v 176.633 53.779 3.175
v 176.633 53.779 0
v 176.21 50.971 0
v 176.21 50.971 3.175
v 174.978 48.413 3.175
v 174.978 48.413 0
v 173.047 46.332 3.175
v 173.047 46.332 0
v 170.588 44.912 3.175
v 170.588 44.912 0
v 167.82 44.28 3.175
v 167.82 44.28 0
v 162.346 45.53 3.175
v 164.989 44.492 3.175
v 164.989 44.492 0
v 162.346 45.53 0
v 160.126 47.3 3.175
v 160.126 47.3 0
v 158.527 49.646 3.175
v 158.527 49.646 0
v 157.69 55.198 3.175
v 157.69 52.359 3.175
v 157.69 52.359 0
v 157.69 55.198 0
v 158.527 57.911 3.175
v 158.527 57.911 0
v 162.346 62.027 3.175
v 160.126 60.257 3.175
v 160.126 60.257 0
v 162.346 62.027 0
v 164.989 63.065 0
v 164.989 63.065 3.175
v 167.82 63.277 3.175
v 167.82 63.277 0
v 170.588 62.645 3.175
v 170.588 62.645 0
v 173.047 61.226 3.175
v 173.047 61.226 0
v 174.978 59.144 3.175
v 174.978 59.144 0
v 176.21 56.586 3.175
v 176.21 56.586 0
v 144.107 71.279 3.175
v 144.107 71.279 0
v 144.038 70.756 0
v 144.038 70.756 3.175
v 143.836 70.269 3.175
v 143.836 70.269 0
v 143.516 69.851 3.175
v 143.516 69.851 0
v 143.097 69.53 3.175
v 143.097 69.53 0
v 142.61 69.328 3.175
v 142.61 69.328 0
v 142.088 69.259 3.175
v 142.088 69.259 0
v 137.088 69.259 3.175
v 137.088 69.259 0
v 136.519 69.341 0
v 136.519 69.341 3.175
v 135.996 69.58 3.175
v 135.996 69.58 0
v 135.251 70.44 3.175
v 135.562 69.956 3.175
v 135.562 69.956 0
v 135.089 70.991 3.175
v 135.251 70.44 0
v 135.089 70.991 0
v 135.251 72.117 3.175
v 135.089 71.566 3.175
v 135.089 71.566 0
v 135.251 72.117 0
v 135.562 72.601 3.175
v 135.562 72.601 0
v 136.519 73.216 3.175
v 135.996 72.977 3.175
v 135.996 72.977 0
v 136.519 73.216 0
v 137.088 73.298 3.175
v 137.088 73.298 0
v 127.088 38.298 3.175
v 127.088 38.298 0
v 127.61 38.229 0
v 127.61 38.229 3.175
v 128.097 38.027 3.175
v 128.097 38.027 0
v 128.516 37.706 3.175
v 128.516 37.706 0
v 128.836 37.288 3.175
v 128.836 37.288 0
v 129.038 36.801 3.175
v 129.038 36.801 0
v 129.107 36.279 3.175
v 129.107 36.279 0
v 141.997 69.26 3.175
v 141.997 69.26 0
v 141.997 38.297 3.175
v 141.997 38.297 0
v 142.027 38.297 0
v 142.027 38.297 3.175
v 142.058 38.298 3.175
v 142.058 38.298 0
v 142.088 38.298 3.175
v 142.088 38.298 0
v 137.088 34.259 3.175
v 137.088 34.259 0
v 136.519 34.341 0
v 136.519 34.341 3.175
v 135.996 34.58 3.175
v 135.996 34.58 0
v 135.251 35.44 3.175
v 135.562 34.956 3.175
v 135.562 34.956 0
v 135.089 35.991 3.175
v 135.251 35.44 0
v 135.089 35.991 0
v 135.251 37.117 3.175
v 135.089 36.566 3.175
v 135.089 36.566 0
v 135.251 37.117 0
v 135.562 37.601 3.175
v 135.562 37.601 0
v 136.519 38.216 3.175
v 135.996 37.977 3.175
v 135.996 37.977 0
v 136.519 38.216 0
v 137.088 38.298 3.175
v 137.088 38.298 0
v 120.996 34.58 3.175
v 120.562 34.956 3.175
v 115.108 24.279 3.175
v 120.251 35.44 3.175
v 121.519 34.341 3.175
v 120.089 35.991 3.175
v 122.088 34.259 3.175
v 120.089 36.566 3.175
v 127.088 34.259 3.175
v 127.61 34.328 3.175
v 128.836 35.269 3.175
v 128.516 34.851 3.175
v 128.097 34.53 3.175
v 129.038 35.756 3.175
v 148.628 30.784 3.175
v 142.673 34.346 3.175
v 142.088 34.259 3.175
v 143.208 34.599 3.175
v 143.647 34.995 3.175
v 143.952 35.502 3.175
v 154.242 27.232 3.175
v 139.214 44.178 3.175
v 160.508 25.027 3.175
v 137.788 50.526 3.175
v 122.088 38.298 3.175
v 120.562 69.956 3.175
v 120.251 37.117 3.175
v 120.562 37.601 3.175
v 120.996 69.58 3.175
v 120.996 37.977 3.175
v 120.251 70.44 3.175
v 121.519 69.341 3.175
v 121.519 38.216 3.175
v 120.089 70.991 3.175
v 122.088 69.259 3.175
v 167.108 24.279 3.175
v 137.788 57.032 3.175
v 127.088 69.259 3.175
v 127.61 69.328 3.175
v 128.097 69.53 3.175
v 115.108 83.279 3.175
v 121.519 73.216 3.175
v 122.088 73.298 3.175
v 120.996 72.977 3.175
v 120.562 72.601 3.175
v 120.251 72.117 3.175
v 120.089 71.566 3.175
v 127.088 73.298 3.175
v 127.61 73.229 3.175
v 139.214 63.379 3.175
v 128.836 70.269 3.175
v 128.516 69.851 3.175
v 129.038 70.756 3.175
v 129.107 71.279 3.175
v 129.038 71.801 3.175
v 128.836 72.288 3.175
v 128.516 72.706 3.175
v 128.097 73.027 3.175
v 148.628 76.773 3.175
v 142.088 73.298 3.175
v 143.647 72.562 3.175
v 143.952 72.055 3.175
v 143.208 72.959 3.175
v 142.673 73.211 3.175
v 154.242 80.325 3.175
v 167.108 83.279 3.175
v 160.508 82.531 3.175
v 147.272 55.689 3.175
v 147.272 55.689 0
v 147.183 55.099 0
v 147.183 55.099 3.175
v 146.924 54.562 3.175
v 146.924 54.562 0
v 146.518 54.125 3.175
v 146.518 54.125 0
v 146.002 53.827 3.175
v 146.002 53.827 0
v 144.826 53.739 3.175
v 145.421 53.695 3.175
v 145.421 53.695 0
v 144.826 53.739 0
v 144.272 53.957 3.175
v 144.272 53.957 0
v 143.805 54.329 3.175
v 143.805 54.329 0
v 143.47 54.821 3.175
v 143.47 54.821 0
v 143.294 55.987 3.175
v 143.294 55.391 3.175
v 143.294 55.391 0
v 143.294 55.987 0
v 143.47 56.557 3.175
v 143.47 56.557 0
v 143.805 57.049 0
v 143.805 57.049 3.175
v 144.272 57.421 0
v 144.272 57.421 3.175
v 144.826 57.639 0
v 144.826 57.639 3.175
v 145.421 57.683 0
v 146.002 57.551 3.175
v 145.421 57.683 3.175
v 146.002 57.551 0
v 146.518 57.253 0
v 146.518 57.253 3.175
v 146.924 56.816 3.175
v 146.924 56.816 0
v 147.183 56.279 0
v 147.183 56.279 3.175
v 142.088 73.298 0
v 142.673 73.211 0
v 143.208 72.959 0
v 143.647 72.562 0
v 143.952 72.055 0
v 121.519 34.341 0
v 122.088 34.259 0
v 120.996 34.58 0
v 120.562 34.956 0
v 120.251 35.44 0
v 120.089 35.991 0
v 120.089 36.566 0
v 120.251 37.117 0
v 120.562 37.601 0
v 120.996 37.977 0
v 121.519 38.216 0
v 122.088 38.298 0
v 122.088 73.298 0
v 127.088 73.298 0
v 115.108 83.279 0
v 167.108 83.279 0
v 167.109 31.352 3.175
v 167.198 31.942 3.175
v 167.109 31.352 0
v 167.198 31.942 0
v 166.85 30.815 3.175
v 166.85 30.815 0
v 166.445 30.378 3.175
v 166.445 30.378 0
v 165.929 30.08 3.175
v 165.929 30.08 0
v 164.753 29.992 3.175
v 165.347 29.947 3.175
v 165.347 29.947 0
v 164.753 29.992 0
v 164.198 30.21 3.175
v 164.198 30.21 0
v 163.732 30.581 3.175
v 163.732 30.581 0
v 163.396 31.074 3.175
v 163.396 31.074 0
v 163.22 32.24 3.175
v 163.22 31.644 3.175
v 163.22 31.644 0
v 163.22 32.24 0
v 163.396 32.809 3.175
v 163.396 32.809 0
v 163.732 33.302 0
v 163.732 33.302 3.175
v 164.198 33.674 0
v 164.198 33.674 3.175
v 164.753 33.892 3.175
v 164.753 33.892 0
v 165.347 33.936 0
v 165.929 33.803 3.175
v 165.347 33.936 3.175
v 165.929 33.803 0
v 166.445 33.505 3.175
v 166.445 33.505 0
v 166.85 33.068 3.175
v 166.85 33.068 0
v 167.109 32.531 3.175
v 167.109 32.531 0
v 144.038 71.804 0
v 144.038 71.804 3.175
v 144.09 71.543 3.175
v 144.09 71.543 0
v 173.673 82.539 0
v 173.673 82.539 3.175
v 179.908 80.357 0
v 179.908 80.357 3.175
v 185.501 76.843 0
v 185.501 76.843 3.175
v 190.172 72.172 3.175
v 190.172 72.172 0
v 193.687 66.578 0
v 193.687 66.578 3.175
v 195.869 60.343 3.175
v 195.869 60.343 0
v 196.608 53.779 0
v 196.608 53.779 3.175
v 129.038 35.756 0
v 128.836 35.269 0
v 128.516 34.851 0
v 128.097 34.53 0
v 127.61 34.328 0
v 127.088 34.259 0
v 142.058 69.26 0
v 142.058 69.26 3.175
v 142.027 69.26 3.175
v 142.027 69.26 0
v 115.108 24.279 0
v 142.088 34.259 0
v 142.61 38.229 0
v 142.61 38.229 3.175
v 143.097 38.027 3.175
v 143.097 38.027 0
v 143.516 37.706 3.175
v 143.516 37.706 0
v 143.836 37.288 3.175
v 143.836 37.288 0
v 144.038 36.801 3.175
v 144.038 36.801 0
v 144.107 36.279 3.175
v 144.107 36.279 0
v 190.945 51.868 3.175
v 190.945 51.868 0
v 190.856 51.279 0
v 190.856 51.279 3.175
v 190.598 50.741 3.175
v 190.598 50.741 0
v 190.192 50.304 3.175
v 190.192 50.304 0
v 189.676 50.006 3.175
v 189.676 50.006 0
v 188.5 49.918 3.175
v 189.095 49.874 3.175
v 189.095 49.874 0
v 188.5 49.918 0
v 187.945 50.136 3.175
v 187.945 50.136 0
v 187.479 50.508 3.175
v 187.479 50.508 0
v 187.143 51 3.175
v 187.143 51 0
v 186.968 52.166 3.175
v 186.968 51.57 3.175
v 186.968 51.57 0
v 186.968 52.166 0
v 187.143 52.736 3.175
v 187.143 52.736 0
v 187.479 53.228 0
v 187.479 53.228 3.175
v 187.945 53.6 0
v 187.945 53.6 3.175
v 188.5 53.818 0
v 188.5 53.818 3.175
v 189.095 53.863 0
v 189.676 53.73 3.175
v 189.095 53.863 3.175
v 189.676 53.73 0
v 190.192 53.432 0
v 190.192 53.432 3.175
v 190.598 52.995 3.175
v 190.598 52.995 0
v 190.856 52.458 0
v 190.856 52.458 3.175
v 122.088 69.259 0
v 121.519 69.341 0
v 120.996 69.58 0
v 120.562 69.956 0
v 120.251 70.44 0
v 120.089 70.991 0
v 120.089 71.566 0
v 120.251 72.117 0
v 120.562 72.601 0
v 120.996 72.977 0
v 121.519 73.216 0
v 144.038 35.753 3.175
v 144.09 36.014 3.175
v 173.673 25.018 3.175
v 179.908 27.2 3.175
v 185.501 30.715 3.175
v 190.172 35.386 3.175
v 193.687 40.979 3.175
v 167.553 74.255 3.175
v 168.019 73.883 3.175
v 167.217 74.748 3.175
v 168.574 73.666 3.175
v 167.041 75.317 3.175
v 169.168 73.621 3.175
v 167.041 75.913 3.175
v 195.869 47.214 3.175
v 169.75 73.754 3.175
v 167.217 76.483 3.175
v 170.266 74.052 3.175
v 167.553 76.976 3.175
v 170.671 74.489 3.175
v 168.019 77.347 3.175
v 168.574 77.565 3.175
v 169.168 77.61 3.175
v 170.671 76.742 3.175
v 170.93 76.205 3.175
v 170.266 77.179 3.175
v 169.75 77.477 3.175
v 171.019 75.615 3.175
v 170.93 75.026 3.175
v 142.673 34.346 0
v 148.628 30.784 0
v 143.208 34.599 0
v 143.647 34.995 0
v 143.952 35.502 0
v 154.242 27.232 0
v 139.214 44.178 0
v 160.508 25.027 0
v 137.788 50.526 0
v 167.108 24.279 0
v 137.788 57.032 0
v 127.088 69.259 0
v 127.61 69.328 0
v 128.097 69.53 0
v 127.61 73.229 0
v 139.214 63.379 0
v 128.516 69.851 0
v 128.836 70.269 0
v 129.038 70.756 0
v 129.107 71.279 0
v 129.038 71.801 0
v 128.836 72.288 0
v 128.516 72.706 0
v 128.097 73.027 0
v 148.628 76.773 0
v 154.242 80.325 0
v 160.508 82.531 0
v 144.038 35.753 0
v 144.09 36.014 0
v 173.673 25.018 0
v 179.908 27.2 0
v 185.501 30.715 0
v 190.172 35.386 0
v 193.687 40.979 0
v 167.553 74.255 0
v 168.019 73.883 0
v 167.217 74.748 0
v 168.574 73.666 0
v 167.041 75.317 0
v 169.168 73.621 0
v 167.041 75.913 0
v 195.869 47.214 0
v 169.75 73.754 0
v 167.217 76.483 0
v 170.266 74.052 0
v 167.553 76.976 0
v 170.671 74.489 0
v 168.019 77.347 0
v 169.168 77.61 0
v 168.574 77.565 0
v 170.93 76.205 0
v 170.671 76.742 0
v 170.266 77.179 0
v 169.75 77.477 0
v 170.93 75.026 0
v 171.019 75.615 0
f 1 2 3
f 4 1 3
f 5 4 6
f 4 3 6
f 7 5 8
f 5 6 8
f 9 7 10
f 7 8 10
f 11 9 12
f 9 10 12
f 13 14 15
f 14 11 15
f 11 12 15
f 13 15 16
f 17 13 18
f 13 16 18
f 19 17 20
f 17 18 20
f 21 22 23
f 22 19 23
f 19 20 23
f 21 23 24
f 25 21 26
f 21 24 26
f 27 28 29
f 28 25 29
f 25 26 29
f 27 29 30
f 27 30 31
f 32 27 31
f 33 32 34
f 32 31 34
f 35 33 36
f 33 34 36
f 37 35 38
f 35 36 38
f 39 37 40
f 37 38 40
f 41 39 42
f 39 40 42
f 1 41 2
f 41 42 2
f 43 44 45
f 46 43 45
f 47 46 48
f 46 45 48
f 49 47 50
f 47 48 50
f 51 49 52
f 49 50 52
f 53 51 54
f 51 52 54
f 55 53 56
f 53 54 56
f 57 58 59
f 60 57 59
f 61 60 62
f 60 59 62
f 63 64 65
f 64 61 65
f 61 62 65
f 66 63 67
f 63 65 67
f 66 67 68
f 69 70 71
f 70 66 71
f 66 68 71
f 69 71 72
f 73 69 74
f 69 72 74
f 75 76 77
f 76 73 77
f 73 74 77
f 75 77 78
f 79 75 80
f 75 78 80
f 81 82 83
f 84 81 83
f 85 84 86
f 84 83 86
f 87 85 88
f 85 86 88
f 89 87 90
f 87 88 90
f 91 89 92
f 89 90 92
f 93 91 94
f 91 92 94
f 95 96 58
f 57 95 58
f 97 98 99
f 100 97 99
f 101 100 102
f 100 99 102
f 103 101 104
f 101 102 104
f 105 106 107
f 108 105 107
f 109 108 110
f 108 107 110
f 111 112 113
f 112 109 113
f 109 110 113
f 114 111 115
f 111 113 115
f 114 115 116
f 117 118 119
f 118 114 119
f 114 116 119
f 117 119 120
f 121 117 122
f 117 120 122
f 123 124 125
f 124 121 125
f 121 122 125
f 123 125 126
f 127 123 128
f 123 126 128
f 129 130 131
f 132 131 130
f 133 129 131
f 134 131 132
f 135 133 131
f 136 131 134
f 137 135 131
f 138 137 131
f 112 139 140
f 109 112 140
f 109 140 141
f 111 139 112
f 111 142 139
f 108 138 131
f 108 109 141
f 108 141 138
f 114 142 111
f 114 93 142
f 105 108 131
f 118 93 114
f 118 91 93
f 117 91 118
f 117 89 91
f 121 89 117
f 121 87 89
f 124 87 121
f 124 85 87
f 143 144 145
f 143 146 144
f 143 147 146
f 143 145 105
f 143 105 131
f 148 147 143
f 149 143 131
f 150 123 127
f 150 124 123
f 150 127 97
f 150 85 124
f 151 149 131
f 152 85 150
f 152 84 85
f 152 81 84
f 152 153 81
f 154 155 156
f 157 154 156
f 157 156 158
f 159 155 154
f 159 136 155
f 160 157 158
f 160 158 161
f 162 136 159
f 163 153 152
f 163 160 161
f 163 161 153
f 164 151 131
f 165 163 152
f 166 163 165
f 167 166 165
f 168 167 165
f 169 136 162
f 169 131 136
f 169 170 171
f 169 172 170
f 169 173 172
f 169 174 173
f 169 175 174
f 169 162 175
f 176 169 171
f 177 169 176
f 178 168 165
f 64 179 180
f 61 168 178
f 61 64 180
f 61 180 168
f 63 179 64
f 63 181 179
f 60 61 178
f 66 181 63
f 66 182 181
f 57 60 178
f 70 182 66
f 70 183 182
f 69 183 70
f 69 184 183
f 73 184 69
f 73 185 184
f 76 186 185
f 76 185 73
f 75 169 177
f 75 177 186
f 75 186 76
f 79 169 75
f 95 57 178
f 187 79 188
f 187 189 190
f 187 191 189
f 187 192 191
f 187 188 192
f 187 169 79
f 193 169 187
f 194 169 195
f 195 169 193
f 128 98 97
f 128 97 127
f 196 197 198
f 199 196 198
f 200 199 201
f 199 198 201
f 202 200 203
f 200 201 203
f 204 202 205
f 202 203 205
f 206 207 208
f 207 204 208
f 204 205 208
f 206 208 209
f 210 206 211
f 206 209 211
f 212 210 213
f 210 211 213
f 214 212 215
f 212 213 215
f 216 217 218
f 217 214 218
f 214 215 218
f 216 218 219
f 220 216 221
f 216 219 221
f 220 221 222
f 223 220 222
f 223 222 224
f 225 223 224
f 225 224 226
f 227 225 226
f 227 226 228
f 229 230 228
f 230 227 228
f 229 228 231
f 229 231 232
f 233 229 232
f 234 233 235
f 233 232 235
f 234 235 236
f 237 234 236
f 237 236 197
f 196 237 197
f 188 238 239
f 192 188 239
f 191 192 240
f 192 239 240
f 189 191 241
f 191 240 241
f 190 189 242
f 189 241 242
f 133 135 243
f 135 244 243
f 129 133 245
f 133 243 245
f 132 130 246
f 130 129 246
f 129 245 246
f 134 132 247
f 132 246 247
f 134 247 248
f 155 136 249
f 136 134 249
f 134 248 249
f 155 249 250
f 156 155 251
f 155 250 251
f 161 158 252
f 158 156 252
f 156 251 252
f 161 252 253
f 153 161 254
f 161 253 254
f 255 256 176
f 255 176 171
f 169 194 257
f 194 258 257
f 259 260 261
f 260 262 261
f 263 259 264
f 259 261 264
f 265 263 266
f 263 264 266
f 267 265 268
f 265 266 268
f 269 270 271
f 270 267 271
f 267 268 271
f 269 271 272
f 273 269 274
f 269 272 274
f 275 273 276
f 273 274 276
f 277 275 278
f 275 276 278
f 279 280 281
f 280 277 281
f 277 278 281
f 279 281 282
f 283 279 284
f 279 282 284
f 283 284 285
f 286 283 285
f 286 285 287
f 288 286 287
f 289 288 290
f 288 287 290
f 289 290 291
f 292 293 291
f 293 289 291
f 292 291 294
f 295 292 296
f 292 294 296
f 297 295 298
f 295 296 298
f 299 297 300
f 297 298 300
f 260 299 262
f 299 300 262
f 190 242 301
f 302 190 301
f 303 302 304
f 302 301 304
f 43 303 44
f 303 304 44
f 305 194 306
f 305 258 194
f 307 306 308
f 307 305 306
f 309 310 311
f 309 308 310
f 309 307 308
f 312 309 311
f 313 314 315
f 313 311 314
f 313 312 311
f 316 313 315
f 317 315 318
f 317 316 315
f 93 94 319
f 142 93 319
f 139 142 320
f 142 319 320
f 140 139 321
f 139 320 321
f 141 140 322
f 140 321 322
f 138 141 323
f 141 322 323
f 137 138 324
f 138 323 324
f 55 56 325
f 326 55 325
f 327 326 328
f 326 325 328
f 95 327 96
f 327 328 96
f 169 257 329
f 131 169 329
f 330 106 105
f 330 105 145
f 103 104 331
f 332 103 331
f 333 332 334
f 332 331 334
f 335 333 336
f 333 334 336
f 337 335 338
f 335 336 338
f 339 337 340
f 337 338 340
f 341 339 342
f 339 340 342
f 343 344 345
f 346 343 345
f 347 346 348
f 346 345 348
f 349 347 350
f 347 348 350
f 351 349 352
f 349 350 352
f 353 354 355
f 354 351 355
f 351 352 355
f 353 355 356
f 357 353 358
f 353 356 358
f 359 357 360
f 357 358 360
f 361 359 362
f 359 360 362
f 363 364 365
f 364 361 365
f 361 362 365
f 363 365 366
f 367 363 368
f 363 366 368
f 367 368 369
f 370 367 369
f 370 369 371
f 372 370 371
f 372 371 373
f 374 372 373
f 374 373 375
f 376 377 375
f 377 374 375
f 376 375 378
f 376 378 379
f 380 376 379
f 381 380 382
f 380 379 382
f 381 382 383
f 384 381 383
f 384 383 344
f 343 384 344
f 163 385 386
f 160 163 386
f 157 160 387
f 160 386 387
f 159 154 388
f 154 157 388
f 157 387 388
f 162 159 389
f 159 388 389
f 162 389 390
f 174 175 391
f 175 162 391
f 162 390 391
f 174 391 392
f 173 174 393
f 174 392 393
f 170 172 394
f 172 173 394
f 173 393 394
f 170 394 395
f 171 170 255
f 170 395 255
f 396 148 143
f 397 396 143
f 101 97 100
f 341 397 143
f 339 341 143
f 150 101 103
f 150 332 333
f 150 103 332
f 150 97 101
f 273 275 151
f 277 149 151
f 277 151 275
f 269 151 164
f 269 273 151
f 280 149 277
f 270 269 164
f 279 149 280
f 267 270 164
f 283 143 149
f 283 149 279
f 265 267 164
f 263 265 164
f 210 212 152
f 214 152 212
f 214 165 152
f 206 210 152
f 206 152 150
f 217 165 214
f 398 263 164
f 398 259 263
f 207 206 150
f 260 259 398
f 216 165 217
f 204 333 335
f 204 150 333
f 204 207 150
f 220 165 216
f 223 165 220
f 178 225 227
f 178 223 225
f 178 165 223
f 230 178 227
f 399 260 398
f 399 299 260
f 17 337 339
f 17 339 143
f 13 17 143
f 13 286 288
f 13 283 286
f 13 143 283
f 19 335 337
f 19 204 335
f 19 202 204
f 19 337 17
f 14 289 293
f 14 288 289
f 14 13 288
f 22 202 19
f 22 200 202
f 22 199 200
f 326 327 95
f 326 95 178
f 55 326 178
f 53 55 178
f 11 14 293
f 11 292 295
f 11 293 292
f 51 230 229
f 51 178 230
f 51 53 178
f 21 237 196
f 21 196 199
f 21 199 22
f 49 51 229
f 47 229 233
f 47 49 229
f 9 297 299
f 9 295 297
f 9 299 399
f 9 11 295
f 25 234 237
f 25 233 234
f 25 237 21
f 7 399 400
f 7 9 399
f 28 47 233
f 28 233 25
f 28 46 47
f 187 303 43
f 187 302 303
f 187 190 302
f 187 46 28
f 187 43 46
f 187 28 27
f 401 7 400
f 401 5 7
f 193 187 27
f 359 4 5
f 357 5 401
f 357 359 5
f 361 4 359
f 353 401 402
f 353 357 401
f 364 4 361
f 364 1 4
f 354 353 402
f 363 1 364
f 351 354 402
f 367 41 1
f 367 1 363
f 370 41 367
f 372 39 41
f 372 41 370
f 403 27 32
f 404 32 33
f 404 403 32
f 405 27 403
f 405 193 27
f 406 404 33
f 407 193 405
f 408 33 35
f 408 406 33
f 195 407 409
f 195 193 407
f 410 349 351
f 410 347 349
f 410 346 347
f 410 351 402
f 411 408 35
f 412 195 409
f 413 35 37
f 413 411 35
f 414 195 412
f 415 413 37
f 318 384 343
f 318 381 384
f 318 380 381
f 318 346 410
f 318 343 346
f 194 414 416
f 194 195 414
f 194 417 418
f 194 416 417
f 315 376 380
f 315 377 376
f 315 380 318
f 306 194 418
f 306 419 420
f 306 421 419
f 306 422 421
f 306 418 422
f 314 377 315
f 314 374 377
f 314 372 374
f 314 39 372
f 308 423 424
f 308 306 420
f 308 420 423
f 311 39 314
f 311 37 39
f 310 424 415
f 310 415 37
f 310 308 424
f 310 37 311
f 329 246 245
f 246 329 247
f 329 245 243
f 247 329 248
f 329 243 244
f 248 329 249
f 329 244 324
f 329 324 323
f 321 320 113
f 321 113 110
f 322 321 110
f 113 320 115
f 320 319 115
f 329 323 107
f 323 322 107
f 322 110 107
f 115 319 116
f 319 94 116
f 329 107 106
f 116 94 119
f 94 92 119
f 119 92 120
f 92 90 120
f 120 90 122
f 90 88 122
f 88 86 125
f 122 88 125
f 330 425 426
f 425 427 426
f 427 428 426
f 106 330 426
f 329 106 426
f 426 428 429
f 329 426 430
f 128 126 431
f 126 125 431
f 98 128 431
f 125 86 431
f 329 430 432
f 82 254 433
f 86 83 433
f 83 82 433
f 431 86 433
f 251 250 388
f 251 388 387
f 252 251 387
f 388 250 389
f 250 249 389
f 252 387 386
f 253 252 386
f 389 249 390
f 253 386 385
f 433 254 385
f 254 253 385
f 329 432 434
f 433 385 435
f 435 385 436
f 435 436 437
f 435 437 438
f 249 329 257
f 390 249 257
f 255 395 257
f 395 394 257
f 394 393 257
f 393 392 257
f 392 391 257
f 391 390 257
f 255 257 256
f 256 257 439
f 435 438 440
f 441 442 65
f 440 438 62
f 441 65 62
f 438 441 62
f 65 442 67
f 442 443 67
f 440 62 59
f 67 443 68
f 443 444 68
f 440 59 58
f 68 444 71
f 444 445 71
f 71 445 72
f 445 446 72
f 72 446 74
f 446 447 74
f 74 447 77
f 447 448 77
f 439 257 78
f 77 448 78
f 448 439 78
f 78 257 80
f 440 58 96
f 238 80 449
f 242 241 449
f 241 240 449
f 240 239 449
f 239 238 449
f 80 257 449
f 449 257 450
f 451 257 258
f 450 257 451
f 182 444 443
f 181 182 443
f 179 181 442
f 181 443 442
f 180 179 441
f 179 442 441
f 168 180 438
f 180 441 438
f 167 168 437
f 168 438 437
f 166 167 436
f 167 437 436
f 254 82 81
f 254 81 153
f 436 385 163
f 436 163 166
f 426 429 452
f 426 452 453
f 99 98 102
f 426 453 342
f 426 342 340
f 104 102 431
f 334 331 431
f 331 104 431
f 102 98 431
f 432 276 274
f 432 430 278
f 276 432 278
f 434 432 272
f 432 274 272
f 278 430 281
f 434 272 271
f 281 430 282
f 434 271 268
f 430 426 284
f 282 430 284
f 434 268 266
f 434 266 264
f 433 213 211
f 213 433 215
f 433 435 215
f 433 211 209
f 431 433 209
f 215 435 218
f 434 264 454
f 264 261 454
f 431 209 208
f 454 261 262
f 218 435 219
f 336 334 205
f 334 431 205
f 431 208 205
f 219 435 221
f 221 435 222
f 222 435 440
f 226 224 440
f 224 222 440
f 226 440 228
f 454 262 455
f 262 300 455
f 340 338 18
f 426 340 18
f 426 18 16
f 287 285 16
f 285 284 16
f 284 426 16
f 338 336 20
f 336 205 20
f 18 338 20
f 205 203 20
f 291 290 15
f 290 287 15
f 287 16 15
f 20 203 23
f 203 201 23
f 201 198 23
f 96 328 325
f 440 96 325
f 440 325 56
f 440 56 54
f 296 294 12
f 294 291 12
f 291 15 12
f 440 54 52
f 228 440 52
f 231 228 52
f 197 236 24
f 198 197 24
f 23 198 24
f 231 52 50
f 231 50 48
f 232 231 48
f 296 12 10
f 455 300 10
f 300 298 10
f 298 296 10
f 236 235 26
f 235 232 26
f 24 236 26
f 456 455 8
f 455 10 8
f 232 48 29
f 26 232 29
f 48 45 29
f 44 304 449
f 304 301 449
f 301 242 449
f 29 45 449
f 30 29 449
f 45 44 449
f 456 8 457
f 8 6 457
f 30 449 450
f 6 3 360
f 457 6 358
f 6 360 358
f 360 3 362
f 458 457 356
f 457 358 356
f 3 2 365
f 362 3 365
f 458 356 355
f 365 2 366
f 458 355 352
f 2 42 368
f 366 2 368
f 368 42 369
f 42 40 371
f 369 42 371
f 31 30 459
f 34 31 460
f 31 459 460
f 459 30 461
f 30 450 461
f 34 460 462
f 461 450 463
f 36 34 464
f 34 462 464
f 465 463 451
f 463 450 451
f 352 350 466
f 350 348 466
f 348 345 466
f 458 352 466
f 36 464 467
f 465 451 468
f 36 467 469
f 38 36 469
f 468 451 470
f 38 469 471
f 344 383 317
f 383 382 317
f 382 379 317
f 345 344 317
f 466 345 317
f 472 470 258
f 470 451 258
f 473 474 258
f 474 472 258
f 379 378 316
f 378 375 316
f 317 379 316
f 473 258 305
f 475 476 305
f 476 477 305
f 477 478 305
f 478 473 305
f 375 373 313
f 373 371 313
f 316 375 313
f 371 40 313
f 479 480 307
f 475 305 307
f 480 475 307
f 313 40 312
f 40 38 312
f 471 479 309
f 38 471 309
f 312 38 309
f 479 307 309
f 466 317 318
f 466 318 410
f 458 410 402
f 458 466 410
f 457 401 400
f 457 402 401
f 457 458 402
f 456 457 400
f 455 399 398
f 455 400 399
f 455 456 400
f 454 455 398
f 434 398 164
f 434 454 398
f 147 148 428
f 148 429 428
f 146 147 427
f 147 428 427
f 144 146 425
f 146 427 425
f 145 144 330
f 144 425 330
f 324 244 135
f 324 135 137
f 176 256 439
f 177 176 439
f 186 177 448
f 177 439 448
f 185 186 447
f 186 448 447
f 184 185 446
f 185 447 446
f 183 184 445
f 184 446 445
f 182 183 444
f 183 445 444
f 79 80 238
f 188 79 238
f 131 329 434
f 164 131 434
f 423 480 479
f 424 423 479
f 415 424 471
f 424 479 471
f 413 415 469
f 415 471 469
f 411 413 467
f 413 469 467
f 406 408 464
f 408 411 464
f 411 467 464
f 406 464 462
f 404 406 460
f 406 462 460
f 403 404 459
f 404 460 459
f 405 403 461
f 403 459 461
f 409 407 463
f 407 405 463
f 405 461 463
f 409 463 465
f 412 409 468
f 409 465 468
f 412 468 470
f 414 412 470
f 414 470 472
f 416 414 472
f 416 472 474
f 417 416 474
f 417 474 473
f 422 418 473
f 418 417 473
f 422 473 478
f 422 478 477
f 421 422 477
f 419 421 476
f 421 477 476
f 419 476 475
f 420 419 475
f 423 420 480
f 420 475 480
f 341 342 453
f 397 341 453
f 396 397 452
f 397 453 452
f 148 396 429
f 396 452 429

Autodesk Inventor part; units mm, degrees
ref_plane "YZ Plane" through (0, 0, 0) normal (1, 0, 0) x (0, 1, 0)
ref_plane "XZ Plane" through (0, 0, 0) normal (0, 1, 0) x (-1, 0, 0)
ref_plane "XY Plane" through (0, 0, 0) normal (0, 0, 1) x (1, 0, 0)
sketch "Sketch1" plane through (0, 0, 0) normal (0, 0, 1) x (1, 0, 0)
  circle A0 centre (167.1084, 53.7786) radius 29.5
  line L0 (167.1084, 83.2786) -> (115.1084, 83.2786)
  line L1 (115.1084, 83.2786) -> (115.1084, 24.2786)
  line L2 (115.1084, 24.2786) -> (167.1084, 24.2786)
  circle A1 centre (167.1084, 53.7786) radius 9.525
  circle A2 centre (145.2715, 55.689) radius 2
  circle A3 centre (169.0189, 75.6154) radius 2
  circle A4 centre (188.9453, 51.8681) radius 2
  circle A5 centre (165.1979, 31.9417) radius 2
  line L3 (169.0189, 75.6154) -> (165.1979, 31.9417) construction
  line L4 (188.9453, 51.8681) -> (145.2715, 55.689) construction
  line L5 (-39.3217, 0) -> (235.9301, 0) projected
  line L6 (0, -16.6557) -> (0, 99.9343) projected
  line L7 (167.1084, 53.7786) -> (100.0684, 53.7786) construction
  circle A6 centre (122.0877, 71.2786) radius 2.0193
  circle A7 centre (127.0877, 71.2786) radius 2.0193
  circle A8 centre (137.0877, 71.2786) radius 2.0193
  circle A9 centre (142.0877, 71.2786) radius 2.0193
  circle A10 centre (127.0877, 36.2786) radius 2.0193
  circle A11 centre (122.0877, 36.2786) radius 2.0193
  circle A12 centre (142.0877, 36.2786) radius 2.0193
  circle A13 centre (137.0877, 36.2786) radius 2.0193
  line L8 (127.0877, 73.2979) -> (122.0877, 73.2979)
  line L9 (122.0877, 69.2593) -> (127.0877, 69.2593)
  line L10 (137.0877, 73.2979) -> (142.0877, 73.2979)
  line L11 (142.0877, 69.2593) -> (137.0877, 69.2593)
  line L12 (142.0877, 38.2979) -> (137.0877, 38.2979)
  line L13 (137.0877, 34.2593) -> (142.0877, 34.2593)
  line L14 (127.0877, 38.2979) -> (122.0877, 38.2979)
  line L15 (122.0877, 34.2593) -> (127.0877, 34.2593)
  circle A14 centre (125.0684, 71.2786) radius 2.0193 construction
  circle A15 centre (125.0684, 36.2786) radius 2.0193 construction
  line L16 (125.0684, 71.2786) -> (125.0684, 36.2786) construction
  circle A16 centre (140.0684, 36.2786) radius 2.0193 construction
  circle A17 centre (140.0684, 71.2786) radius 2.0193 construction
  line L17 (140.0684, 71.2786) -> (140.0684, 36.2786) construction
  point P0 (0, 0)
  dimension "d0" = 59
  dimension "d1" = 52
  dimension "d2" = 19.05
  dimension "d3" = 4
  dimension "d4" = 4
  dimension "d5" = 4
  dimension "d6" = 4
  dimension "d7" = 355
  dimension "d8" = 31
  dimension "d9" = 31
  dimension "d10" = 31
  dimension "d11" = 67.04
  dimension "d13" = 4.0386
  dimension "d14" = 4.0386
  dimension "d16" = 4.0386
  dimension "d17" = 4.0386
  dimension "d18" = 4.0386
  dimension "d19" = 4.0386
  dimension "d20" = 4.0386
  dimension "d21" = 4.0386
  dimension "d22" = 5
  dimension "d23" = 5
  dimension "d24" = 5
  dimension "d25" = 5
  dimension "d26" = 4.0386
  dimension "d27" = 25
  dimension "d29" = 15
  dimension "d32" = 35
extrude "Extrusion1" add sketch "Sketch1" along normal blind 3.175 contours A0 A12 A9 | A0 A9 L10 A8 L11 L12 A13 L13 A12 L2 L1 L0
properties part number "MMplate2"
